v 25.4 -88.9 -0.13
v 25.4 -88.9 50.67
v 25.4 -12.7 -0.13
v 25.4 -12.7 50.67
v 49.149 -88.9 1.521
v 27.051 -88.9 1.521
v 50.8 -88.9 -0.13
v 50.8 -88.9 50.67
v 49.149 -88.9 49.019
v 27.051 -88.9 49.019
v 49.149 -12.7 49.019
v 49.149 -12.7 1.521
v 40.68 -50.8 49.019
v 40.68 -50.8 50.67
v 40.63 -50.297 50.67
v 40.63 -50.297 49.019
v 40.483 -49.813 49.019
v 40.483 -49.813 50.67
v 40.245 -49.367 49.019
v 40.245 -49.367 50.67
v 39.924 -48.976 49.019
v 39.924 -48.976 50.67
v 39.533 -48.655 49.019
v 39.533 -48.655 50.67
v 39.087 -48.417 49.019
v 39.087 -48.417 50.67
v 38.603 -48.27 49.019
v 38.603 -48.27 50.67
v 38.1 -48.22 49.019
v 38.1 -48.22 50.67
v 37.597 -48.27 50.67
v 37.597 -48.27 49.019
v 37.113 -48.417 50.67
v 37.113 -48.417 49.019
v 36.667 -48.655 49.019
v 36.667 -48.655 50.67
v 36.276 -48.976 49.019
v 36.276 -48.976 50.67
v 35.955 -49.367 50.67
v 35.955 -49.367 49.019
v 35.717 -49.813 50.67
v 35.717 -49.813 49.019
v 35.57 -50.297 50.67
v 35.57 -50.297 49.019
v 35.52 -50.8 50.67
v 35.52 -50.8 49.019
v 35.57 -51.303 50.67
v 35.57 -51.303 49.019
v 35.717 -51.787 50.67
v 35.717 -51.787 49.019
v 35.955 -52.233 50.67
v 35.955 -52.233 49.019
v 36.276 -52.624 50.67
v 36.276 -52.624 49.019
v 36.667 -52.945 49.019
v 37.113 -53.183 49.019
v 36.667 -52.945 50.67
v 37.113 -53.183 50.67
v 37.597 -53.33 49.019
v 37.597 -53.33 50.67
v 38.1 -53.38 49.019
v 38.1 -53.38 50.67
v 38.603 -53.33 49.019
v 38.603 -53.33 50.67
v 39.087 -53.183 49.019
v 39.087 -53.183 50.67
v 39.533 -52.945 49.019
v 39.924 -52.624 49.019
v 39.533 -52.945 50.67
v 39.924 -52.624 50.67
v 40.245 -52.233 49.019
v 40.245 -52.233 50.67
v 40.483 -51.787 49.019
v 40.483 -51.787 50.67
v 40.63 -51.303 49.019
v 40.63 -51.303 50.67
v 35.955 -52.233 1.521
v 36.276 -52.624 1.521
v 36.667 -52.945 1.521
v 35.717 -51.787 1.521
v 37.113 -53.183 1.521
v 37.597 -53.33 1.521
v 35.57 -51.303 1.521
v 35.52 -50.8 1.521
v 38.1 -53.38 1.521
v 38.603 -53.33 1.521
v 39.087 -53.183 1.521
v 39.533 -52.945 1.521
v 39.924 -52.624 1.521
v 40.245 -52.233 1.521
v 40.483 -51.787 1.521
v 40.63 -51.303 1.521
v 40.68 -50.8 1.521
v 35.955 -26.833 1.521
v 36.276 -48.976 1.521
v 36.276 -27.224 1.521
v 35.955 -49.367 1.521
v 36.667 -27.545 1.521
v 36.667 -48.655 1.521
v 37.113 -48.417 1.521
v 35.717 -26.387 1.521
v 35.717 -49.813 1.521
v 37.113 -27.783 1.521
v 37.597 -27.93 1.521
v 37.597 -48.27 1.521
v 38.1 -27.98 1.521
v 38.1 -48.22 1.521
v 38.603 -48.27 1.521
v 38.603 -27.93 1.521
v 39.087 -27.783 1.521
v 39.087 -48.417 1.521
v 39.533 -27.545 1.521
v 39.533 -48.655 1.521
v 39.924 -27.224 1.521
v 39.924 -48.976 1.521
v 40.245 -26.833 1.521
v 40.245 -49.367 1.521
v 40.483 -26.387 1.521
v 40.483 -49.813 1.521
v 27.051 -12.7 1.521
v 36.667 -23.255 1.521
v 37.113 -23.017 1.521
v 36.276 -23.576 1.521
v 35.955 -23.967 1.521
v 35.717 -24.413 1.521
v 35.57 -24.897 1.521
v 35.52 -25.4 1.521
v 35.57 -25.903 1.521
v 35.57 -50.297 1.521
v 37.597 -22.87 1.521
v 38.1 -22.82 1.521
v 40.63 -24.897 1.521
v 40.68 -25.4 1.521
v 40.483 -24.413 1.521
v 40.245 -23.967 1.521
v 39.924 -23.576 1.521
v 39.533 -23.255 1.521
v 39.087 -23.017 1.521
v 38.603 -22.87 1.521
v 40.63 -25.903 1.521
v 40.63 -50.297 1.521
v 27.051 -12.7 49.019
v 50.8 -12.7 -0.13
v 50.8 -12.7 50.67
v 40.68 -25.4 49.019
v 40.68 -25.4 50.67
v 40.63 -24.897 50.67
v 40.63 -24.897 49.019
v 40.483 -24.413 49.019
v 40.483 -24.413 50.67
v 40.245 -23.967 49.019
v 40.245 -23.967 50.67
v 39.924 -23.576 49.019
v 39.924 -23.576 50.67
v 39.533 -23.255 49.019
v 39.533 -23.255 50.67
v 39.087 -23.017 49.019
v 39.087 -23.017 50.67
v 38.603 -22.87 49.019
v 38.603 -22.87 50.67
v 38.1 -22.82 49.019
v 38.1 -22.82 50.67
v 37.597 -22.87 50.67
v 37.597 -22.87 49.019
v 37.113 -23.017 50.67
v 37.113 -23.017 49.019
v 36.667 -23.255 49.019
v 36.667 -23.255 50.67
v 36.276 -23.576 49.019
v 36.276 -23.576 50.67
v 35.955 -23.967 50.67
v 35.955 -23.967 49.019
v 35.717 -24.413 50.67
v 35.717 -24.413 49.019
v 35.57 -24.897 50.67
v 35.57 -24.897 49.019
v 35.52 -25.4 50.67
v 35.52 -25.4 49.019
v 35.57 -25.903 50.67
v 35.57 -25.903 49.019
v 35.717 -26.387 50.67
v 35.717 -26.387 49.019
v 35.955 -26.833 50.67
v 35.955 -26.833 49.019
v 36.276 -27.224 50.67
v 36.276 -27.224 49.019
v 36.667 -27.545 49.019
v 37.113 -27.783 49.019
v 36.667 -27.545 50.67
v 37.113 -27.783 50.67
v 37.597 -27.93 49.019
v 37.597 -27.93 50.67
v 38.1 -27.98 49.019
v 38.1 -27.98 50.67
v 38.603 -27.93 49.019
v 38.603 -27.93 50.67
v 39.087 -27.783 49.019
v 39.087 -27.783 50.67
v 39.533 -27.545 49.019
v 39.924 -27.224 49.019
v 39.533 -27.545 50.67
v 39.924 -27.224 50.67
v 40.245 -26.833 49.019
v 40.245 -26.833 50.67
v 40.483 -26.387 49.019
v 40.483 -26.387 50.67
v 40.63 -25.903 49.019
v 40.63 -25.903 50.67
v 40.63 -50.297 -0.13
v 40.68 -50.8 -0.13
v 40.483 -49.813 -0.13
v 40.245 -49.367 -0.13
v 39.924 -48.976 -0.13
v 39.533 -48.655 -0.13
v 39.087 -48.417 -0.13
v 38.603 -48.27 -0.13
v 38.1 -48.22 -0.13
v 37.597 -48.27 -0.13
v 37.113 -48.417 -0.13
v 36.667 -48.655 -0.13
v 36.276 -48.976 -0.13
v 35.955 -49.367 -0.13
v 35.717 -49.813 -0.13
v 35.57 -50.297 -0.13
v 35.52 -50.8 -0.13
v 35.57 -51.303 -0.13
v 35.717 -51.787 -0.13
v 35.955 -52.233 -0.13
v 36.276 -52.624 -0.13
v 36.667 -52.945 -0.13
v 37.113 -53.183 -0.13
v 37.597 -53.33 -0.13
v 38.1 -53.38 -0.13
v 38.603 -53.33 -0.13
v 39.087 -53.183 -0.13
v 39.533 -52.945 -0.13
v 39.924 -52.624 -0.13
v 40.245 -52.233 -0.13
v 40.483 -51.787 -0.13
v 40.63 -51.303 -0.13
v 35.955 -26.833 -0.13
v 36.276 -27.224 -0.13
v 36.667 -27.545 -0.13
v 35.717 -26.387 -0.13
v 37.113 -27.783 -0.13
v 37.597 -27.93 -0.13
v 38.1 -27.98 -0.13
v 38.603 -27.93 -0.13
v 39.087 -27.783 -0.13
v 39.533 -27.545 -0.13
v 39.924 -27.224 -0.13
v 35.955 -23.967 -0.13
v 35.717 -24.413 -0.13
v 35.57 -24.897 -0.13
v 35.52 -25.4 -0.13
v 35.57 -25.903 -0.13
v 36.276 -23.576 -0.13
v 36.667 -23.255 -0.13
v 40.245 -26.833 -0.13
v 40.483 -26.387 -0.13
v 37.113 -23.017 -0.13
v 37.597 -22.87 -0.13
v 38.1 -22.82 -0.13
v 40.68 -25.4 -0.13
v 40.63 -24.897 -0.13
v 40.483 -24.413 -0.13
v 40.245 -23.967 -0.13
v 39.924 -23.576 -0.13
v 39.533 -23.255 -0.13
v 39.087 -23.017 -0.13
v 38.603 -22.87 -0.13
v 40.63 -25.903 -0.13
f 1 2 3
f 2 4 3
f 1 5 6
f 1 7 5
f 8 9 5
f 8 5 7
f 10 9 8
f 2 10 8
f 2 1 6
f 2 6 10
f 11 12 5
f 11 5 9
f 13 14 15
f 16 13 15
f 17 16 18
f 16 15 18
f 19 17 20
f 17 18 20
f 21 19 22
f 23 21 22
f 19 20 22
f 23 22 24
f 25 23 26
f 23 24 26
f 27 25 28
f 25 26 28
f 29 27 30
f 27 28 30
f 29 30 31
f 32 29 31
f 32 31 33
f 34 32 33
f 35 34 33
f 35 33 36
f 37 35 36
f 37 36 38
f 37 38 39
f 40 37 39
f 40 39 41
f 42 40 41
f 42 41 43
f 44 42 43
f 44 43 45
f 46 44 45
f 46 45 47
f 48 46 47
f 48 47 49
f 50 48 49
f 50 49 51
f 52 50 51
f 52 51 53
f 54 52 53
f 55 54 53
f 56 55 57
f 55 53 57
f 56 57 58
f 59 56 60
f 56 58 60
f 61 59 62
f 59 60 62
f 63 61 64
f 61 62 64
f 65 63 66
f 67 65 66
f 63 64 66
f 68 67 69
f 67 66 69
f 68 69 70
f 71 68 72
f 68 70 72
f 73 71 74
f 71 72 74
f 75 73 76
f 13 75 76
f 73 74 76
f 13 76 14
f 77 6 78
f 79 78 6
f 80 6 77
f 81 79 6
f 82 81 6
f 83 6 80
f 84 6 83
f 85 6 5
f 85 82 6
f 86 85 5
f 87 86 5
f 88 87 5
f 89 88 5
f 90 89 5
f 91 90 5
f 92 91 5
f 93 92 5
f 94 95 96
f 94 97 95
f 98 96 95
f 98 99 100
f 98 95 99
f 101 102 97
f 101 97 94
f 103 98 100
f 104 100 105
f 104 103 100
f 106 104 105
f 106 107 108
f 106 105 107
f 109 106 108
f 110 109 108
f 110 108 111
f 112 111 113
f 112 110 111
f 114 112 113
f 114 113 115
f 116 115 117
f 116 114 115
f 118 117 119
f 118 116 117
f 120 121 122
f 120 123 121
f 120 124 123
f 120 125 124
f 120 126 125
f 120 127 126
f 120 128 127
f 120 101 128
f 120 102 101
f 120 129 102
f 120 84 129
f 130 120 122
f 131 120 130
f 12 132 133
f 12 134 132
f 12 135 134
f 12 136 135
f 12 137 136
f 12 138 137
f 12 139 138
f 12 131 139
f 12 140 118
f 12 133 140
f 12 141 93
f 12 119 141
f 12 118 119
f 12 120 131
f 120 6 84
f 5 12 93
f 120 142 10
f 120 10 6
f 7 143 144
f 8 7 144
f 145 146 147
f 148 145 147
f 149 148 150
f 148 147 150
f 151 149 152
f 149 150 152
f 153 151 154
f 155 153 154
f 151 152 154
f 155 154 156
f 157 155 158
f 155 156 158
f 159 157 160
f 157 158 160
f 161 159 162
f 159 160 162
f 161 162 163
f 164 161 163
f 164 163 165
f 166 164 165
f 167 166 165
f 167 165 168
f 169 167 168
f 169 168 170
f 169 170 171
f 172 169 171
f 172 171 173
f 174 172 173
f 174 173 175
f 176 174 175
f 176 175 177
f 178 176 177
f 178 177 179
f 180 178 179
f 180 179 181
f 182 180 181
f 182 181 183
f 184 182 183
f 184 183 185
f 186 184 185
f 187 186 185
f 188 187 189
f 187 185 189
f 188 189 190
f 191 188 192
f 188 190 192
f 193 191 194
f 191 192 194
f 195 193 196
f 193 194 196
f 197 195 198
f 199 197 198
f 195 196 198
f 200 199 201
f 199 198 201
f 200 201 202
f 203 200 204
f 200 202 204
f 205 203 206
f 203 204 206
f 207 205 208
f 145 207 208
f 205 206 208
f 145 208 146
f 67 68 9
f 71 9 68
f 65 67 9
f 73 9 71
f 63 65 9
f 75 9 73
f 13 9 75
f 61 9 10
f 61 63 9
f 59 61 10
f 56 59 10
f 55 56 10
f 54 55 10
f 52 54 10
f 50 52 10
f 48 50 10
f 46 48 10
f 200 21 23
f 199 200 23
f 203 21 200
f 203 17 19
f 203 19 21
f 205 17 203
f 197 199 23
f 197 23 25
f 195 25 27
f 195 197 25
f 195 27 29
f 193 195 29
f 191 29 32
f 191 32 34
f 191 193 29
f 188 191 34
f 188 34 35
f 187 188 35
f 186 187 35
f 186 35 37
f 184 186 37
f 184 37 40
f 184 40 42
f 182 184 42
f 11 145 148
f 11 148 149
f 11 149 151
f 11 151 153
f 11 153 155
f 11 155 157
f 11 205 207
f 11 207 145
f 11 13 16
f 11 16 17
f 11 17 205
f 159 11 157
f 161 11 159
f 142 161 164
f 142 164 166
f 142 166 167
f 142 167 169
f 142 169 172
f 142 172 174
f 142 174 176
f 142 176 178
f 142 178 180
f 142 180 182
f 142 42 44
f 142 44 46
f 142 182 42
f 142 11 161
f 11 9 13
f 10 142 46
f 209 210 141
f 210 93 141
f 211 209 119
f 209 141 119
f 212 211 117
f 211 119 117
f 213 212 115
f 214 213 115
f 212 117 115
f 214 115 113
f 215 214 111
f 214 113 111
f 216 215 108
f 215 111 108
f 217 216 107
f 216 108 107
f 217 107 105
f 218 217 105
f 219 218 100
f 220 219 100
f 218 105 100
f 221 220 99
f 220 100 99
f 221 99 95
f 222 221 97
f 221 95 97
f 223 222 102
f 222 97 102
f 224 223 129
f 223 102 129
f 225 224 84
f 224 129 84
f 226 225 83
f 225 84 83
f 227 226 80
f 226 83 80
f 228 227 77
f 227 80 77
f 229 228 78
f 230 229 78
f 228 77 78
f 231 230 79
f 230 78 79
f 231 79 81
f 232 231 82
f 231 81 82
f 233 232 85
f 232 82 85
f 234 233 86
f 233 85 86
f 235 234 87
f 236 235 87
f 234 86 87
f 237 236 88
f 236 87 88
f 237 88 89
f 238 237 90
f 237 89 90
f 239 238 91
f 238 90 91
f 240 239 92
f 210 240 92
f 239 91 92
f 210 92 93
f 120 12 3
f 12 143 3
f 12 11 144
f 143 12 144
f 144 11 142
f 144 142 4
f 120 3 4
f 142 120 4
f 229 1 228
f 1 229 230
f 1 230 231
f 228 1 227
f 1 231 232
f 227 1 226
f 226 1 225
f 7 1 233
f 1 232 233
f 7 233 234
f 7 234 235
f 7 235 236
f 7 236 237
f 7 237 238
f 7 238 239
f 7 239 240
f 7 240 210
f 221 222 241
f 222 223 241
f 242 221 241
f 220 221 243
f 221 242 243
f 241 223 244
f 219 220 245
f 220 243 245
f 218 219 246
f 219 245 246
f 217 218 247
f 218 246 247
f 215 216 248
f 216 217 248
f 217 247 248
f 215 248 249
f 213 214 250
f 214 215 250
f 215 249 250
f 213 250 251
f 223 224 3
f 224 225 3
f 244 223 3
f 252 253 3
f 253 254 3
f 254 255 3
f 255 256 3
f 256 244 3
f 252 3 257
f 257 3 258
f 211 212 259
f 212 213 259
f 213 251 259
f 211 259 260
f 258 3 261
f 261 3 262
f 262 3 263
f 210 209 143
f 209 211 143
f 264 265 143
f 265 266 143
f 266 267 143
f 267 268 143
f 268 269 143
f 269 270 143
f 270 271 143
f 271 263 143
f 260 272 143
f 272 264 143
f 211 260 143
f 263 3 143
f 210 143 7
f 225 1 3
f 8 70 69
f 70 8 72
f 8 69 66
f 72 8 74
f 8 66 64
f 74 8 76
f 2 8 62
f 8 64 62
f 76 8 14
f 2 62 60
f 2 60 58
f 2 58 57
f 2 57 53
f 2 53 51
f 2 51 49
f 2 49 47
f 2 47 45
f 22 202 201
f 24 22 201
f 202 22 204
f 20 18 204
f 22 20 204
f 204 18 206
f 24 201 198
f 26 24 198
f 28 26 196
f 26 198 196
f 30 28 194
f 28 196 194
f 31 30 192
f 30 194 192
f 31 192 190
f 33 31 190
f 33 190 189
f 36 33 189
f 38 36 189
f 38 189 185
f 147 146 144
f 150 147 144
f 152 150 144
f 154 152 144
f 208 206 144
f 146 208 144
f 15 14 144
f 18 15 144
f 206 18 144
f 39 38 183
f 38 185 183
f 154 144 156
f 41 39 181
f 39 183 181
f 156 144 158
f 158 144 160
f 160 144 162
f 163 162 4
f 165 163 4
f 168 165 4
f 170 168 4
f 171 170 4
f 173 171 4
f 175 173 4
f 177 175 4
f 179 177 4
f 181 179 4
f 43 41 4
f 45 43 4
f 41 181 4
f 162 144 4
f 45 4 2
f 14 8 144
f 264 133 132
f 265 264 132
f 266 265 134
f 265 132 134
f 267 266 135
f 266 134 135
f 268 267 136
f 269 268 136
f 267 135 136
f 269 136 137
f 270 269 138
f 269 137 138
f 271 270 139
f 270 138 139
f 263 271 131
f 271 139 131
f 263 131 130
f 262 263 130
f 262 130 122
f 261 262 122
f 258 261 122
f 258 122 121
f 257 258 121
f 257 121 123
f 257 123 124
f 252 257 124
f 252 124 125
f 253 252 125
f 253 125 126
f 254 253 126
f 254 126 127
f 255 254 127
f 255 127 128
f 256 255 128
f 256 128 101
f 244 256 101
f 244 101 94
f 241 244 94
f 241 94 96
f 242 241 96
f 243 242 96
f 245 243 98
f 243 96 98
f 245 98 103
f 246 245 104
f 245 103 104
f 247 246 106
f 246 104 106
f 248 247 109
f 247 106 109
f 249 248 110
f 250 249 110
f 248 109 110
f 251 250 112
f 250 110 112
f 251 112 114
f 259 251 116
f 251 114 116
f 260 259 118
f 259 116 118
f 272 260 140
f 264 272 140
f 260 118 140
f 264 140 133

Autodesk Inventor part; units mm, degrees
ref_plane "YZ Plane" through (0, 0, 0) normal (1, 0, 0) x (0, 1, 0)
ref_plane "XZ Plane" through (0, 0, 0) normal (0, 1, 0) x (-1, 0, 0)
ref_plane "XY Plane" through (0, 0, 0) normal (0, 0, 1) x (1, 0, 0)
ref_plane "Work Plane1" through (50.8, -12.7, 0) normal (0, -1, 0) x (0, 0, 1)
sketch "Sketch1" plane through (50.8, -12.7, 0) normal (0, -1, 0) x (0, 0, 1)
  line L0 (-0.1298, 0) -> (50.6702, 0)
  line L1 (50.6702, 0) -> (50.6702, 25.4)
  line L2 (50.6702, 25.4) -> (-0.1298, 25.4)
  line L3 (-0.1298, 25.4) -> (-0.1298, 0)
  line L4 (49.0192, 23.749) -> (1.5212, 23.749)
  line L5 (1.5212, 23.749) -> (1.5212, 1.651)
  line L6 (1.5212, 1.651) -> (49.0192, 1.651)
  line L7 (49.0192, 1.651) -> (49.0192, 23.749)
  point P0 (0, 50.8)
  dimension "d0" = 25.4
  dimension "d1" = 50.8
  dimension "d3" = 1.651
  dimension "d4" = 1.651
  dimension "d5" = 1.651
  dimension "d6" = 1.651
extrude "Extrusion1" add sketch "Sketch1" along normal blind 76.2
sketch "Sketch2" plane through (25.4, -12.7, 50.6702) normal (0, 0, 1) x (1, 0, 0)
  circle A0 centre (12.7, -12.7) radius 2.5797
  circle A1 centre (12.7, -38.1) radius 2.5797
  line L0 (25.4, 0) -> (0, 0) projected
  line L1 (0, 0) -> (0, -76.2) projected
  point P0 (-25.4, 12.7)
  dimension "d9" = 12.7
  dimension "d10" = 25.4
  dimension "d11" = 5.1594
  dimension "d12" = 5.1594
  dimension "d13" = 12.7
  dimension "d14" = 12.7
extrude "Extrusion2" cut sketch "Sketch2" against normal blind 76.2
equation "\"d4\" = d3"
equation "\"d5\" = d3"
equation "\"d6\" = d3"
properties part number "bar thing"
